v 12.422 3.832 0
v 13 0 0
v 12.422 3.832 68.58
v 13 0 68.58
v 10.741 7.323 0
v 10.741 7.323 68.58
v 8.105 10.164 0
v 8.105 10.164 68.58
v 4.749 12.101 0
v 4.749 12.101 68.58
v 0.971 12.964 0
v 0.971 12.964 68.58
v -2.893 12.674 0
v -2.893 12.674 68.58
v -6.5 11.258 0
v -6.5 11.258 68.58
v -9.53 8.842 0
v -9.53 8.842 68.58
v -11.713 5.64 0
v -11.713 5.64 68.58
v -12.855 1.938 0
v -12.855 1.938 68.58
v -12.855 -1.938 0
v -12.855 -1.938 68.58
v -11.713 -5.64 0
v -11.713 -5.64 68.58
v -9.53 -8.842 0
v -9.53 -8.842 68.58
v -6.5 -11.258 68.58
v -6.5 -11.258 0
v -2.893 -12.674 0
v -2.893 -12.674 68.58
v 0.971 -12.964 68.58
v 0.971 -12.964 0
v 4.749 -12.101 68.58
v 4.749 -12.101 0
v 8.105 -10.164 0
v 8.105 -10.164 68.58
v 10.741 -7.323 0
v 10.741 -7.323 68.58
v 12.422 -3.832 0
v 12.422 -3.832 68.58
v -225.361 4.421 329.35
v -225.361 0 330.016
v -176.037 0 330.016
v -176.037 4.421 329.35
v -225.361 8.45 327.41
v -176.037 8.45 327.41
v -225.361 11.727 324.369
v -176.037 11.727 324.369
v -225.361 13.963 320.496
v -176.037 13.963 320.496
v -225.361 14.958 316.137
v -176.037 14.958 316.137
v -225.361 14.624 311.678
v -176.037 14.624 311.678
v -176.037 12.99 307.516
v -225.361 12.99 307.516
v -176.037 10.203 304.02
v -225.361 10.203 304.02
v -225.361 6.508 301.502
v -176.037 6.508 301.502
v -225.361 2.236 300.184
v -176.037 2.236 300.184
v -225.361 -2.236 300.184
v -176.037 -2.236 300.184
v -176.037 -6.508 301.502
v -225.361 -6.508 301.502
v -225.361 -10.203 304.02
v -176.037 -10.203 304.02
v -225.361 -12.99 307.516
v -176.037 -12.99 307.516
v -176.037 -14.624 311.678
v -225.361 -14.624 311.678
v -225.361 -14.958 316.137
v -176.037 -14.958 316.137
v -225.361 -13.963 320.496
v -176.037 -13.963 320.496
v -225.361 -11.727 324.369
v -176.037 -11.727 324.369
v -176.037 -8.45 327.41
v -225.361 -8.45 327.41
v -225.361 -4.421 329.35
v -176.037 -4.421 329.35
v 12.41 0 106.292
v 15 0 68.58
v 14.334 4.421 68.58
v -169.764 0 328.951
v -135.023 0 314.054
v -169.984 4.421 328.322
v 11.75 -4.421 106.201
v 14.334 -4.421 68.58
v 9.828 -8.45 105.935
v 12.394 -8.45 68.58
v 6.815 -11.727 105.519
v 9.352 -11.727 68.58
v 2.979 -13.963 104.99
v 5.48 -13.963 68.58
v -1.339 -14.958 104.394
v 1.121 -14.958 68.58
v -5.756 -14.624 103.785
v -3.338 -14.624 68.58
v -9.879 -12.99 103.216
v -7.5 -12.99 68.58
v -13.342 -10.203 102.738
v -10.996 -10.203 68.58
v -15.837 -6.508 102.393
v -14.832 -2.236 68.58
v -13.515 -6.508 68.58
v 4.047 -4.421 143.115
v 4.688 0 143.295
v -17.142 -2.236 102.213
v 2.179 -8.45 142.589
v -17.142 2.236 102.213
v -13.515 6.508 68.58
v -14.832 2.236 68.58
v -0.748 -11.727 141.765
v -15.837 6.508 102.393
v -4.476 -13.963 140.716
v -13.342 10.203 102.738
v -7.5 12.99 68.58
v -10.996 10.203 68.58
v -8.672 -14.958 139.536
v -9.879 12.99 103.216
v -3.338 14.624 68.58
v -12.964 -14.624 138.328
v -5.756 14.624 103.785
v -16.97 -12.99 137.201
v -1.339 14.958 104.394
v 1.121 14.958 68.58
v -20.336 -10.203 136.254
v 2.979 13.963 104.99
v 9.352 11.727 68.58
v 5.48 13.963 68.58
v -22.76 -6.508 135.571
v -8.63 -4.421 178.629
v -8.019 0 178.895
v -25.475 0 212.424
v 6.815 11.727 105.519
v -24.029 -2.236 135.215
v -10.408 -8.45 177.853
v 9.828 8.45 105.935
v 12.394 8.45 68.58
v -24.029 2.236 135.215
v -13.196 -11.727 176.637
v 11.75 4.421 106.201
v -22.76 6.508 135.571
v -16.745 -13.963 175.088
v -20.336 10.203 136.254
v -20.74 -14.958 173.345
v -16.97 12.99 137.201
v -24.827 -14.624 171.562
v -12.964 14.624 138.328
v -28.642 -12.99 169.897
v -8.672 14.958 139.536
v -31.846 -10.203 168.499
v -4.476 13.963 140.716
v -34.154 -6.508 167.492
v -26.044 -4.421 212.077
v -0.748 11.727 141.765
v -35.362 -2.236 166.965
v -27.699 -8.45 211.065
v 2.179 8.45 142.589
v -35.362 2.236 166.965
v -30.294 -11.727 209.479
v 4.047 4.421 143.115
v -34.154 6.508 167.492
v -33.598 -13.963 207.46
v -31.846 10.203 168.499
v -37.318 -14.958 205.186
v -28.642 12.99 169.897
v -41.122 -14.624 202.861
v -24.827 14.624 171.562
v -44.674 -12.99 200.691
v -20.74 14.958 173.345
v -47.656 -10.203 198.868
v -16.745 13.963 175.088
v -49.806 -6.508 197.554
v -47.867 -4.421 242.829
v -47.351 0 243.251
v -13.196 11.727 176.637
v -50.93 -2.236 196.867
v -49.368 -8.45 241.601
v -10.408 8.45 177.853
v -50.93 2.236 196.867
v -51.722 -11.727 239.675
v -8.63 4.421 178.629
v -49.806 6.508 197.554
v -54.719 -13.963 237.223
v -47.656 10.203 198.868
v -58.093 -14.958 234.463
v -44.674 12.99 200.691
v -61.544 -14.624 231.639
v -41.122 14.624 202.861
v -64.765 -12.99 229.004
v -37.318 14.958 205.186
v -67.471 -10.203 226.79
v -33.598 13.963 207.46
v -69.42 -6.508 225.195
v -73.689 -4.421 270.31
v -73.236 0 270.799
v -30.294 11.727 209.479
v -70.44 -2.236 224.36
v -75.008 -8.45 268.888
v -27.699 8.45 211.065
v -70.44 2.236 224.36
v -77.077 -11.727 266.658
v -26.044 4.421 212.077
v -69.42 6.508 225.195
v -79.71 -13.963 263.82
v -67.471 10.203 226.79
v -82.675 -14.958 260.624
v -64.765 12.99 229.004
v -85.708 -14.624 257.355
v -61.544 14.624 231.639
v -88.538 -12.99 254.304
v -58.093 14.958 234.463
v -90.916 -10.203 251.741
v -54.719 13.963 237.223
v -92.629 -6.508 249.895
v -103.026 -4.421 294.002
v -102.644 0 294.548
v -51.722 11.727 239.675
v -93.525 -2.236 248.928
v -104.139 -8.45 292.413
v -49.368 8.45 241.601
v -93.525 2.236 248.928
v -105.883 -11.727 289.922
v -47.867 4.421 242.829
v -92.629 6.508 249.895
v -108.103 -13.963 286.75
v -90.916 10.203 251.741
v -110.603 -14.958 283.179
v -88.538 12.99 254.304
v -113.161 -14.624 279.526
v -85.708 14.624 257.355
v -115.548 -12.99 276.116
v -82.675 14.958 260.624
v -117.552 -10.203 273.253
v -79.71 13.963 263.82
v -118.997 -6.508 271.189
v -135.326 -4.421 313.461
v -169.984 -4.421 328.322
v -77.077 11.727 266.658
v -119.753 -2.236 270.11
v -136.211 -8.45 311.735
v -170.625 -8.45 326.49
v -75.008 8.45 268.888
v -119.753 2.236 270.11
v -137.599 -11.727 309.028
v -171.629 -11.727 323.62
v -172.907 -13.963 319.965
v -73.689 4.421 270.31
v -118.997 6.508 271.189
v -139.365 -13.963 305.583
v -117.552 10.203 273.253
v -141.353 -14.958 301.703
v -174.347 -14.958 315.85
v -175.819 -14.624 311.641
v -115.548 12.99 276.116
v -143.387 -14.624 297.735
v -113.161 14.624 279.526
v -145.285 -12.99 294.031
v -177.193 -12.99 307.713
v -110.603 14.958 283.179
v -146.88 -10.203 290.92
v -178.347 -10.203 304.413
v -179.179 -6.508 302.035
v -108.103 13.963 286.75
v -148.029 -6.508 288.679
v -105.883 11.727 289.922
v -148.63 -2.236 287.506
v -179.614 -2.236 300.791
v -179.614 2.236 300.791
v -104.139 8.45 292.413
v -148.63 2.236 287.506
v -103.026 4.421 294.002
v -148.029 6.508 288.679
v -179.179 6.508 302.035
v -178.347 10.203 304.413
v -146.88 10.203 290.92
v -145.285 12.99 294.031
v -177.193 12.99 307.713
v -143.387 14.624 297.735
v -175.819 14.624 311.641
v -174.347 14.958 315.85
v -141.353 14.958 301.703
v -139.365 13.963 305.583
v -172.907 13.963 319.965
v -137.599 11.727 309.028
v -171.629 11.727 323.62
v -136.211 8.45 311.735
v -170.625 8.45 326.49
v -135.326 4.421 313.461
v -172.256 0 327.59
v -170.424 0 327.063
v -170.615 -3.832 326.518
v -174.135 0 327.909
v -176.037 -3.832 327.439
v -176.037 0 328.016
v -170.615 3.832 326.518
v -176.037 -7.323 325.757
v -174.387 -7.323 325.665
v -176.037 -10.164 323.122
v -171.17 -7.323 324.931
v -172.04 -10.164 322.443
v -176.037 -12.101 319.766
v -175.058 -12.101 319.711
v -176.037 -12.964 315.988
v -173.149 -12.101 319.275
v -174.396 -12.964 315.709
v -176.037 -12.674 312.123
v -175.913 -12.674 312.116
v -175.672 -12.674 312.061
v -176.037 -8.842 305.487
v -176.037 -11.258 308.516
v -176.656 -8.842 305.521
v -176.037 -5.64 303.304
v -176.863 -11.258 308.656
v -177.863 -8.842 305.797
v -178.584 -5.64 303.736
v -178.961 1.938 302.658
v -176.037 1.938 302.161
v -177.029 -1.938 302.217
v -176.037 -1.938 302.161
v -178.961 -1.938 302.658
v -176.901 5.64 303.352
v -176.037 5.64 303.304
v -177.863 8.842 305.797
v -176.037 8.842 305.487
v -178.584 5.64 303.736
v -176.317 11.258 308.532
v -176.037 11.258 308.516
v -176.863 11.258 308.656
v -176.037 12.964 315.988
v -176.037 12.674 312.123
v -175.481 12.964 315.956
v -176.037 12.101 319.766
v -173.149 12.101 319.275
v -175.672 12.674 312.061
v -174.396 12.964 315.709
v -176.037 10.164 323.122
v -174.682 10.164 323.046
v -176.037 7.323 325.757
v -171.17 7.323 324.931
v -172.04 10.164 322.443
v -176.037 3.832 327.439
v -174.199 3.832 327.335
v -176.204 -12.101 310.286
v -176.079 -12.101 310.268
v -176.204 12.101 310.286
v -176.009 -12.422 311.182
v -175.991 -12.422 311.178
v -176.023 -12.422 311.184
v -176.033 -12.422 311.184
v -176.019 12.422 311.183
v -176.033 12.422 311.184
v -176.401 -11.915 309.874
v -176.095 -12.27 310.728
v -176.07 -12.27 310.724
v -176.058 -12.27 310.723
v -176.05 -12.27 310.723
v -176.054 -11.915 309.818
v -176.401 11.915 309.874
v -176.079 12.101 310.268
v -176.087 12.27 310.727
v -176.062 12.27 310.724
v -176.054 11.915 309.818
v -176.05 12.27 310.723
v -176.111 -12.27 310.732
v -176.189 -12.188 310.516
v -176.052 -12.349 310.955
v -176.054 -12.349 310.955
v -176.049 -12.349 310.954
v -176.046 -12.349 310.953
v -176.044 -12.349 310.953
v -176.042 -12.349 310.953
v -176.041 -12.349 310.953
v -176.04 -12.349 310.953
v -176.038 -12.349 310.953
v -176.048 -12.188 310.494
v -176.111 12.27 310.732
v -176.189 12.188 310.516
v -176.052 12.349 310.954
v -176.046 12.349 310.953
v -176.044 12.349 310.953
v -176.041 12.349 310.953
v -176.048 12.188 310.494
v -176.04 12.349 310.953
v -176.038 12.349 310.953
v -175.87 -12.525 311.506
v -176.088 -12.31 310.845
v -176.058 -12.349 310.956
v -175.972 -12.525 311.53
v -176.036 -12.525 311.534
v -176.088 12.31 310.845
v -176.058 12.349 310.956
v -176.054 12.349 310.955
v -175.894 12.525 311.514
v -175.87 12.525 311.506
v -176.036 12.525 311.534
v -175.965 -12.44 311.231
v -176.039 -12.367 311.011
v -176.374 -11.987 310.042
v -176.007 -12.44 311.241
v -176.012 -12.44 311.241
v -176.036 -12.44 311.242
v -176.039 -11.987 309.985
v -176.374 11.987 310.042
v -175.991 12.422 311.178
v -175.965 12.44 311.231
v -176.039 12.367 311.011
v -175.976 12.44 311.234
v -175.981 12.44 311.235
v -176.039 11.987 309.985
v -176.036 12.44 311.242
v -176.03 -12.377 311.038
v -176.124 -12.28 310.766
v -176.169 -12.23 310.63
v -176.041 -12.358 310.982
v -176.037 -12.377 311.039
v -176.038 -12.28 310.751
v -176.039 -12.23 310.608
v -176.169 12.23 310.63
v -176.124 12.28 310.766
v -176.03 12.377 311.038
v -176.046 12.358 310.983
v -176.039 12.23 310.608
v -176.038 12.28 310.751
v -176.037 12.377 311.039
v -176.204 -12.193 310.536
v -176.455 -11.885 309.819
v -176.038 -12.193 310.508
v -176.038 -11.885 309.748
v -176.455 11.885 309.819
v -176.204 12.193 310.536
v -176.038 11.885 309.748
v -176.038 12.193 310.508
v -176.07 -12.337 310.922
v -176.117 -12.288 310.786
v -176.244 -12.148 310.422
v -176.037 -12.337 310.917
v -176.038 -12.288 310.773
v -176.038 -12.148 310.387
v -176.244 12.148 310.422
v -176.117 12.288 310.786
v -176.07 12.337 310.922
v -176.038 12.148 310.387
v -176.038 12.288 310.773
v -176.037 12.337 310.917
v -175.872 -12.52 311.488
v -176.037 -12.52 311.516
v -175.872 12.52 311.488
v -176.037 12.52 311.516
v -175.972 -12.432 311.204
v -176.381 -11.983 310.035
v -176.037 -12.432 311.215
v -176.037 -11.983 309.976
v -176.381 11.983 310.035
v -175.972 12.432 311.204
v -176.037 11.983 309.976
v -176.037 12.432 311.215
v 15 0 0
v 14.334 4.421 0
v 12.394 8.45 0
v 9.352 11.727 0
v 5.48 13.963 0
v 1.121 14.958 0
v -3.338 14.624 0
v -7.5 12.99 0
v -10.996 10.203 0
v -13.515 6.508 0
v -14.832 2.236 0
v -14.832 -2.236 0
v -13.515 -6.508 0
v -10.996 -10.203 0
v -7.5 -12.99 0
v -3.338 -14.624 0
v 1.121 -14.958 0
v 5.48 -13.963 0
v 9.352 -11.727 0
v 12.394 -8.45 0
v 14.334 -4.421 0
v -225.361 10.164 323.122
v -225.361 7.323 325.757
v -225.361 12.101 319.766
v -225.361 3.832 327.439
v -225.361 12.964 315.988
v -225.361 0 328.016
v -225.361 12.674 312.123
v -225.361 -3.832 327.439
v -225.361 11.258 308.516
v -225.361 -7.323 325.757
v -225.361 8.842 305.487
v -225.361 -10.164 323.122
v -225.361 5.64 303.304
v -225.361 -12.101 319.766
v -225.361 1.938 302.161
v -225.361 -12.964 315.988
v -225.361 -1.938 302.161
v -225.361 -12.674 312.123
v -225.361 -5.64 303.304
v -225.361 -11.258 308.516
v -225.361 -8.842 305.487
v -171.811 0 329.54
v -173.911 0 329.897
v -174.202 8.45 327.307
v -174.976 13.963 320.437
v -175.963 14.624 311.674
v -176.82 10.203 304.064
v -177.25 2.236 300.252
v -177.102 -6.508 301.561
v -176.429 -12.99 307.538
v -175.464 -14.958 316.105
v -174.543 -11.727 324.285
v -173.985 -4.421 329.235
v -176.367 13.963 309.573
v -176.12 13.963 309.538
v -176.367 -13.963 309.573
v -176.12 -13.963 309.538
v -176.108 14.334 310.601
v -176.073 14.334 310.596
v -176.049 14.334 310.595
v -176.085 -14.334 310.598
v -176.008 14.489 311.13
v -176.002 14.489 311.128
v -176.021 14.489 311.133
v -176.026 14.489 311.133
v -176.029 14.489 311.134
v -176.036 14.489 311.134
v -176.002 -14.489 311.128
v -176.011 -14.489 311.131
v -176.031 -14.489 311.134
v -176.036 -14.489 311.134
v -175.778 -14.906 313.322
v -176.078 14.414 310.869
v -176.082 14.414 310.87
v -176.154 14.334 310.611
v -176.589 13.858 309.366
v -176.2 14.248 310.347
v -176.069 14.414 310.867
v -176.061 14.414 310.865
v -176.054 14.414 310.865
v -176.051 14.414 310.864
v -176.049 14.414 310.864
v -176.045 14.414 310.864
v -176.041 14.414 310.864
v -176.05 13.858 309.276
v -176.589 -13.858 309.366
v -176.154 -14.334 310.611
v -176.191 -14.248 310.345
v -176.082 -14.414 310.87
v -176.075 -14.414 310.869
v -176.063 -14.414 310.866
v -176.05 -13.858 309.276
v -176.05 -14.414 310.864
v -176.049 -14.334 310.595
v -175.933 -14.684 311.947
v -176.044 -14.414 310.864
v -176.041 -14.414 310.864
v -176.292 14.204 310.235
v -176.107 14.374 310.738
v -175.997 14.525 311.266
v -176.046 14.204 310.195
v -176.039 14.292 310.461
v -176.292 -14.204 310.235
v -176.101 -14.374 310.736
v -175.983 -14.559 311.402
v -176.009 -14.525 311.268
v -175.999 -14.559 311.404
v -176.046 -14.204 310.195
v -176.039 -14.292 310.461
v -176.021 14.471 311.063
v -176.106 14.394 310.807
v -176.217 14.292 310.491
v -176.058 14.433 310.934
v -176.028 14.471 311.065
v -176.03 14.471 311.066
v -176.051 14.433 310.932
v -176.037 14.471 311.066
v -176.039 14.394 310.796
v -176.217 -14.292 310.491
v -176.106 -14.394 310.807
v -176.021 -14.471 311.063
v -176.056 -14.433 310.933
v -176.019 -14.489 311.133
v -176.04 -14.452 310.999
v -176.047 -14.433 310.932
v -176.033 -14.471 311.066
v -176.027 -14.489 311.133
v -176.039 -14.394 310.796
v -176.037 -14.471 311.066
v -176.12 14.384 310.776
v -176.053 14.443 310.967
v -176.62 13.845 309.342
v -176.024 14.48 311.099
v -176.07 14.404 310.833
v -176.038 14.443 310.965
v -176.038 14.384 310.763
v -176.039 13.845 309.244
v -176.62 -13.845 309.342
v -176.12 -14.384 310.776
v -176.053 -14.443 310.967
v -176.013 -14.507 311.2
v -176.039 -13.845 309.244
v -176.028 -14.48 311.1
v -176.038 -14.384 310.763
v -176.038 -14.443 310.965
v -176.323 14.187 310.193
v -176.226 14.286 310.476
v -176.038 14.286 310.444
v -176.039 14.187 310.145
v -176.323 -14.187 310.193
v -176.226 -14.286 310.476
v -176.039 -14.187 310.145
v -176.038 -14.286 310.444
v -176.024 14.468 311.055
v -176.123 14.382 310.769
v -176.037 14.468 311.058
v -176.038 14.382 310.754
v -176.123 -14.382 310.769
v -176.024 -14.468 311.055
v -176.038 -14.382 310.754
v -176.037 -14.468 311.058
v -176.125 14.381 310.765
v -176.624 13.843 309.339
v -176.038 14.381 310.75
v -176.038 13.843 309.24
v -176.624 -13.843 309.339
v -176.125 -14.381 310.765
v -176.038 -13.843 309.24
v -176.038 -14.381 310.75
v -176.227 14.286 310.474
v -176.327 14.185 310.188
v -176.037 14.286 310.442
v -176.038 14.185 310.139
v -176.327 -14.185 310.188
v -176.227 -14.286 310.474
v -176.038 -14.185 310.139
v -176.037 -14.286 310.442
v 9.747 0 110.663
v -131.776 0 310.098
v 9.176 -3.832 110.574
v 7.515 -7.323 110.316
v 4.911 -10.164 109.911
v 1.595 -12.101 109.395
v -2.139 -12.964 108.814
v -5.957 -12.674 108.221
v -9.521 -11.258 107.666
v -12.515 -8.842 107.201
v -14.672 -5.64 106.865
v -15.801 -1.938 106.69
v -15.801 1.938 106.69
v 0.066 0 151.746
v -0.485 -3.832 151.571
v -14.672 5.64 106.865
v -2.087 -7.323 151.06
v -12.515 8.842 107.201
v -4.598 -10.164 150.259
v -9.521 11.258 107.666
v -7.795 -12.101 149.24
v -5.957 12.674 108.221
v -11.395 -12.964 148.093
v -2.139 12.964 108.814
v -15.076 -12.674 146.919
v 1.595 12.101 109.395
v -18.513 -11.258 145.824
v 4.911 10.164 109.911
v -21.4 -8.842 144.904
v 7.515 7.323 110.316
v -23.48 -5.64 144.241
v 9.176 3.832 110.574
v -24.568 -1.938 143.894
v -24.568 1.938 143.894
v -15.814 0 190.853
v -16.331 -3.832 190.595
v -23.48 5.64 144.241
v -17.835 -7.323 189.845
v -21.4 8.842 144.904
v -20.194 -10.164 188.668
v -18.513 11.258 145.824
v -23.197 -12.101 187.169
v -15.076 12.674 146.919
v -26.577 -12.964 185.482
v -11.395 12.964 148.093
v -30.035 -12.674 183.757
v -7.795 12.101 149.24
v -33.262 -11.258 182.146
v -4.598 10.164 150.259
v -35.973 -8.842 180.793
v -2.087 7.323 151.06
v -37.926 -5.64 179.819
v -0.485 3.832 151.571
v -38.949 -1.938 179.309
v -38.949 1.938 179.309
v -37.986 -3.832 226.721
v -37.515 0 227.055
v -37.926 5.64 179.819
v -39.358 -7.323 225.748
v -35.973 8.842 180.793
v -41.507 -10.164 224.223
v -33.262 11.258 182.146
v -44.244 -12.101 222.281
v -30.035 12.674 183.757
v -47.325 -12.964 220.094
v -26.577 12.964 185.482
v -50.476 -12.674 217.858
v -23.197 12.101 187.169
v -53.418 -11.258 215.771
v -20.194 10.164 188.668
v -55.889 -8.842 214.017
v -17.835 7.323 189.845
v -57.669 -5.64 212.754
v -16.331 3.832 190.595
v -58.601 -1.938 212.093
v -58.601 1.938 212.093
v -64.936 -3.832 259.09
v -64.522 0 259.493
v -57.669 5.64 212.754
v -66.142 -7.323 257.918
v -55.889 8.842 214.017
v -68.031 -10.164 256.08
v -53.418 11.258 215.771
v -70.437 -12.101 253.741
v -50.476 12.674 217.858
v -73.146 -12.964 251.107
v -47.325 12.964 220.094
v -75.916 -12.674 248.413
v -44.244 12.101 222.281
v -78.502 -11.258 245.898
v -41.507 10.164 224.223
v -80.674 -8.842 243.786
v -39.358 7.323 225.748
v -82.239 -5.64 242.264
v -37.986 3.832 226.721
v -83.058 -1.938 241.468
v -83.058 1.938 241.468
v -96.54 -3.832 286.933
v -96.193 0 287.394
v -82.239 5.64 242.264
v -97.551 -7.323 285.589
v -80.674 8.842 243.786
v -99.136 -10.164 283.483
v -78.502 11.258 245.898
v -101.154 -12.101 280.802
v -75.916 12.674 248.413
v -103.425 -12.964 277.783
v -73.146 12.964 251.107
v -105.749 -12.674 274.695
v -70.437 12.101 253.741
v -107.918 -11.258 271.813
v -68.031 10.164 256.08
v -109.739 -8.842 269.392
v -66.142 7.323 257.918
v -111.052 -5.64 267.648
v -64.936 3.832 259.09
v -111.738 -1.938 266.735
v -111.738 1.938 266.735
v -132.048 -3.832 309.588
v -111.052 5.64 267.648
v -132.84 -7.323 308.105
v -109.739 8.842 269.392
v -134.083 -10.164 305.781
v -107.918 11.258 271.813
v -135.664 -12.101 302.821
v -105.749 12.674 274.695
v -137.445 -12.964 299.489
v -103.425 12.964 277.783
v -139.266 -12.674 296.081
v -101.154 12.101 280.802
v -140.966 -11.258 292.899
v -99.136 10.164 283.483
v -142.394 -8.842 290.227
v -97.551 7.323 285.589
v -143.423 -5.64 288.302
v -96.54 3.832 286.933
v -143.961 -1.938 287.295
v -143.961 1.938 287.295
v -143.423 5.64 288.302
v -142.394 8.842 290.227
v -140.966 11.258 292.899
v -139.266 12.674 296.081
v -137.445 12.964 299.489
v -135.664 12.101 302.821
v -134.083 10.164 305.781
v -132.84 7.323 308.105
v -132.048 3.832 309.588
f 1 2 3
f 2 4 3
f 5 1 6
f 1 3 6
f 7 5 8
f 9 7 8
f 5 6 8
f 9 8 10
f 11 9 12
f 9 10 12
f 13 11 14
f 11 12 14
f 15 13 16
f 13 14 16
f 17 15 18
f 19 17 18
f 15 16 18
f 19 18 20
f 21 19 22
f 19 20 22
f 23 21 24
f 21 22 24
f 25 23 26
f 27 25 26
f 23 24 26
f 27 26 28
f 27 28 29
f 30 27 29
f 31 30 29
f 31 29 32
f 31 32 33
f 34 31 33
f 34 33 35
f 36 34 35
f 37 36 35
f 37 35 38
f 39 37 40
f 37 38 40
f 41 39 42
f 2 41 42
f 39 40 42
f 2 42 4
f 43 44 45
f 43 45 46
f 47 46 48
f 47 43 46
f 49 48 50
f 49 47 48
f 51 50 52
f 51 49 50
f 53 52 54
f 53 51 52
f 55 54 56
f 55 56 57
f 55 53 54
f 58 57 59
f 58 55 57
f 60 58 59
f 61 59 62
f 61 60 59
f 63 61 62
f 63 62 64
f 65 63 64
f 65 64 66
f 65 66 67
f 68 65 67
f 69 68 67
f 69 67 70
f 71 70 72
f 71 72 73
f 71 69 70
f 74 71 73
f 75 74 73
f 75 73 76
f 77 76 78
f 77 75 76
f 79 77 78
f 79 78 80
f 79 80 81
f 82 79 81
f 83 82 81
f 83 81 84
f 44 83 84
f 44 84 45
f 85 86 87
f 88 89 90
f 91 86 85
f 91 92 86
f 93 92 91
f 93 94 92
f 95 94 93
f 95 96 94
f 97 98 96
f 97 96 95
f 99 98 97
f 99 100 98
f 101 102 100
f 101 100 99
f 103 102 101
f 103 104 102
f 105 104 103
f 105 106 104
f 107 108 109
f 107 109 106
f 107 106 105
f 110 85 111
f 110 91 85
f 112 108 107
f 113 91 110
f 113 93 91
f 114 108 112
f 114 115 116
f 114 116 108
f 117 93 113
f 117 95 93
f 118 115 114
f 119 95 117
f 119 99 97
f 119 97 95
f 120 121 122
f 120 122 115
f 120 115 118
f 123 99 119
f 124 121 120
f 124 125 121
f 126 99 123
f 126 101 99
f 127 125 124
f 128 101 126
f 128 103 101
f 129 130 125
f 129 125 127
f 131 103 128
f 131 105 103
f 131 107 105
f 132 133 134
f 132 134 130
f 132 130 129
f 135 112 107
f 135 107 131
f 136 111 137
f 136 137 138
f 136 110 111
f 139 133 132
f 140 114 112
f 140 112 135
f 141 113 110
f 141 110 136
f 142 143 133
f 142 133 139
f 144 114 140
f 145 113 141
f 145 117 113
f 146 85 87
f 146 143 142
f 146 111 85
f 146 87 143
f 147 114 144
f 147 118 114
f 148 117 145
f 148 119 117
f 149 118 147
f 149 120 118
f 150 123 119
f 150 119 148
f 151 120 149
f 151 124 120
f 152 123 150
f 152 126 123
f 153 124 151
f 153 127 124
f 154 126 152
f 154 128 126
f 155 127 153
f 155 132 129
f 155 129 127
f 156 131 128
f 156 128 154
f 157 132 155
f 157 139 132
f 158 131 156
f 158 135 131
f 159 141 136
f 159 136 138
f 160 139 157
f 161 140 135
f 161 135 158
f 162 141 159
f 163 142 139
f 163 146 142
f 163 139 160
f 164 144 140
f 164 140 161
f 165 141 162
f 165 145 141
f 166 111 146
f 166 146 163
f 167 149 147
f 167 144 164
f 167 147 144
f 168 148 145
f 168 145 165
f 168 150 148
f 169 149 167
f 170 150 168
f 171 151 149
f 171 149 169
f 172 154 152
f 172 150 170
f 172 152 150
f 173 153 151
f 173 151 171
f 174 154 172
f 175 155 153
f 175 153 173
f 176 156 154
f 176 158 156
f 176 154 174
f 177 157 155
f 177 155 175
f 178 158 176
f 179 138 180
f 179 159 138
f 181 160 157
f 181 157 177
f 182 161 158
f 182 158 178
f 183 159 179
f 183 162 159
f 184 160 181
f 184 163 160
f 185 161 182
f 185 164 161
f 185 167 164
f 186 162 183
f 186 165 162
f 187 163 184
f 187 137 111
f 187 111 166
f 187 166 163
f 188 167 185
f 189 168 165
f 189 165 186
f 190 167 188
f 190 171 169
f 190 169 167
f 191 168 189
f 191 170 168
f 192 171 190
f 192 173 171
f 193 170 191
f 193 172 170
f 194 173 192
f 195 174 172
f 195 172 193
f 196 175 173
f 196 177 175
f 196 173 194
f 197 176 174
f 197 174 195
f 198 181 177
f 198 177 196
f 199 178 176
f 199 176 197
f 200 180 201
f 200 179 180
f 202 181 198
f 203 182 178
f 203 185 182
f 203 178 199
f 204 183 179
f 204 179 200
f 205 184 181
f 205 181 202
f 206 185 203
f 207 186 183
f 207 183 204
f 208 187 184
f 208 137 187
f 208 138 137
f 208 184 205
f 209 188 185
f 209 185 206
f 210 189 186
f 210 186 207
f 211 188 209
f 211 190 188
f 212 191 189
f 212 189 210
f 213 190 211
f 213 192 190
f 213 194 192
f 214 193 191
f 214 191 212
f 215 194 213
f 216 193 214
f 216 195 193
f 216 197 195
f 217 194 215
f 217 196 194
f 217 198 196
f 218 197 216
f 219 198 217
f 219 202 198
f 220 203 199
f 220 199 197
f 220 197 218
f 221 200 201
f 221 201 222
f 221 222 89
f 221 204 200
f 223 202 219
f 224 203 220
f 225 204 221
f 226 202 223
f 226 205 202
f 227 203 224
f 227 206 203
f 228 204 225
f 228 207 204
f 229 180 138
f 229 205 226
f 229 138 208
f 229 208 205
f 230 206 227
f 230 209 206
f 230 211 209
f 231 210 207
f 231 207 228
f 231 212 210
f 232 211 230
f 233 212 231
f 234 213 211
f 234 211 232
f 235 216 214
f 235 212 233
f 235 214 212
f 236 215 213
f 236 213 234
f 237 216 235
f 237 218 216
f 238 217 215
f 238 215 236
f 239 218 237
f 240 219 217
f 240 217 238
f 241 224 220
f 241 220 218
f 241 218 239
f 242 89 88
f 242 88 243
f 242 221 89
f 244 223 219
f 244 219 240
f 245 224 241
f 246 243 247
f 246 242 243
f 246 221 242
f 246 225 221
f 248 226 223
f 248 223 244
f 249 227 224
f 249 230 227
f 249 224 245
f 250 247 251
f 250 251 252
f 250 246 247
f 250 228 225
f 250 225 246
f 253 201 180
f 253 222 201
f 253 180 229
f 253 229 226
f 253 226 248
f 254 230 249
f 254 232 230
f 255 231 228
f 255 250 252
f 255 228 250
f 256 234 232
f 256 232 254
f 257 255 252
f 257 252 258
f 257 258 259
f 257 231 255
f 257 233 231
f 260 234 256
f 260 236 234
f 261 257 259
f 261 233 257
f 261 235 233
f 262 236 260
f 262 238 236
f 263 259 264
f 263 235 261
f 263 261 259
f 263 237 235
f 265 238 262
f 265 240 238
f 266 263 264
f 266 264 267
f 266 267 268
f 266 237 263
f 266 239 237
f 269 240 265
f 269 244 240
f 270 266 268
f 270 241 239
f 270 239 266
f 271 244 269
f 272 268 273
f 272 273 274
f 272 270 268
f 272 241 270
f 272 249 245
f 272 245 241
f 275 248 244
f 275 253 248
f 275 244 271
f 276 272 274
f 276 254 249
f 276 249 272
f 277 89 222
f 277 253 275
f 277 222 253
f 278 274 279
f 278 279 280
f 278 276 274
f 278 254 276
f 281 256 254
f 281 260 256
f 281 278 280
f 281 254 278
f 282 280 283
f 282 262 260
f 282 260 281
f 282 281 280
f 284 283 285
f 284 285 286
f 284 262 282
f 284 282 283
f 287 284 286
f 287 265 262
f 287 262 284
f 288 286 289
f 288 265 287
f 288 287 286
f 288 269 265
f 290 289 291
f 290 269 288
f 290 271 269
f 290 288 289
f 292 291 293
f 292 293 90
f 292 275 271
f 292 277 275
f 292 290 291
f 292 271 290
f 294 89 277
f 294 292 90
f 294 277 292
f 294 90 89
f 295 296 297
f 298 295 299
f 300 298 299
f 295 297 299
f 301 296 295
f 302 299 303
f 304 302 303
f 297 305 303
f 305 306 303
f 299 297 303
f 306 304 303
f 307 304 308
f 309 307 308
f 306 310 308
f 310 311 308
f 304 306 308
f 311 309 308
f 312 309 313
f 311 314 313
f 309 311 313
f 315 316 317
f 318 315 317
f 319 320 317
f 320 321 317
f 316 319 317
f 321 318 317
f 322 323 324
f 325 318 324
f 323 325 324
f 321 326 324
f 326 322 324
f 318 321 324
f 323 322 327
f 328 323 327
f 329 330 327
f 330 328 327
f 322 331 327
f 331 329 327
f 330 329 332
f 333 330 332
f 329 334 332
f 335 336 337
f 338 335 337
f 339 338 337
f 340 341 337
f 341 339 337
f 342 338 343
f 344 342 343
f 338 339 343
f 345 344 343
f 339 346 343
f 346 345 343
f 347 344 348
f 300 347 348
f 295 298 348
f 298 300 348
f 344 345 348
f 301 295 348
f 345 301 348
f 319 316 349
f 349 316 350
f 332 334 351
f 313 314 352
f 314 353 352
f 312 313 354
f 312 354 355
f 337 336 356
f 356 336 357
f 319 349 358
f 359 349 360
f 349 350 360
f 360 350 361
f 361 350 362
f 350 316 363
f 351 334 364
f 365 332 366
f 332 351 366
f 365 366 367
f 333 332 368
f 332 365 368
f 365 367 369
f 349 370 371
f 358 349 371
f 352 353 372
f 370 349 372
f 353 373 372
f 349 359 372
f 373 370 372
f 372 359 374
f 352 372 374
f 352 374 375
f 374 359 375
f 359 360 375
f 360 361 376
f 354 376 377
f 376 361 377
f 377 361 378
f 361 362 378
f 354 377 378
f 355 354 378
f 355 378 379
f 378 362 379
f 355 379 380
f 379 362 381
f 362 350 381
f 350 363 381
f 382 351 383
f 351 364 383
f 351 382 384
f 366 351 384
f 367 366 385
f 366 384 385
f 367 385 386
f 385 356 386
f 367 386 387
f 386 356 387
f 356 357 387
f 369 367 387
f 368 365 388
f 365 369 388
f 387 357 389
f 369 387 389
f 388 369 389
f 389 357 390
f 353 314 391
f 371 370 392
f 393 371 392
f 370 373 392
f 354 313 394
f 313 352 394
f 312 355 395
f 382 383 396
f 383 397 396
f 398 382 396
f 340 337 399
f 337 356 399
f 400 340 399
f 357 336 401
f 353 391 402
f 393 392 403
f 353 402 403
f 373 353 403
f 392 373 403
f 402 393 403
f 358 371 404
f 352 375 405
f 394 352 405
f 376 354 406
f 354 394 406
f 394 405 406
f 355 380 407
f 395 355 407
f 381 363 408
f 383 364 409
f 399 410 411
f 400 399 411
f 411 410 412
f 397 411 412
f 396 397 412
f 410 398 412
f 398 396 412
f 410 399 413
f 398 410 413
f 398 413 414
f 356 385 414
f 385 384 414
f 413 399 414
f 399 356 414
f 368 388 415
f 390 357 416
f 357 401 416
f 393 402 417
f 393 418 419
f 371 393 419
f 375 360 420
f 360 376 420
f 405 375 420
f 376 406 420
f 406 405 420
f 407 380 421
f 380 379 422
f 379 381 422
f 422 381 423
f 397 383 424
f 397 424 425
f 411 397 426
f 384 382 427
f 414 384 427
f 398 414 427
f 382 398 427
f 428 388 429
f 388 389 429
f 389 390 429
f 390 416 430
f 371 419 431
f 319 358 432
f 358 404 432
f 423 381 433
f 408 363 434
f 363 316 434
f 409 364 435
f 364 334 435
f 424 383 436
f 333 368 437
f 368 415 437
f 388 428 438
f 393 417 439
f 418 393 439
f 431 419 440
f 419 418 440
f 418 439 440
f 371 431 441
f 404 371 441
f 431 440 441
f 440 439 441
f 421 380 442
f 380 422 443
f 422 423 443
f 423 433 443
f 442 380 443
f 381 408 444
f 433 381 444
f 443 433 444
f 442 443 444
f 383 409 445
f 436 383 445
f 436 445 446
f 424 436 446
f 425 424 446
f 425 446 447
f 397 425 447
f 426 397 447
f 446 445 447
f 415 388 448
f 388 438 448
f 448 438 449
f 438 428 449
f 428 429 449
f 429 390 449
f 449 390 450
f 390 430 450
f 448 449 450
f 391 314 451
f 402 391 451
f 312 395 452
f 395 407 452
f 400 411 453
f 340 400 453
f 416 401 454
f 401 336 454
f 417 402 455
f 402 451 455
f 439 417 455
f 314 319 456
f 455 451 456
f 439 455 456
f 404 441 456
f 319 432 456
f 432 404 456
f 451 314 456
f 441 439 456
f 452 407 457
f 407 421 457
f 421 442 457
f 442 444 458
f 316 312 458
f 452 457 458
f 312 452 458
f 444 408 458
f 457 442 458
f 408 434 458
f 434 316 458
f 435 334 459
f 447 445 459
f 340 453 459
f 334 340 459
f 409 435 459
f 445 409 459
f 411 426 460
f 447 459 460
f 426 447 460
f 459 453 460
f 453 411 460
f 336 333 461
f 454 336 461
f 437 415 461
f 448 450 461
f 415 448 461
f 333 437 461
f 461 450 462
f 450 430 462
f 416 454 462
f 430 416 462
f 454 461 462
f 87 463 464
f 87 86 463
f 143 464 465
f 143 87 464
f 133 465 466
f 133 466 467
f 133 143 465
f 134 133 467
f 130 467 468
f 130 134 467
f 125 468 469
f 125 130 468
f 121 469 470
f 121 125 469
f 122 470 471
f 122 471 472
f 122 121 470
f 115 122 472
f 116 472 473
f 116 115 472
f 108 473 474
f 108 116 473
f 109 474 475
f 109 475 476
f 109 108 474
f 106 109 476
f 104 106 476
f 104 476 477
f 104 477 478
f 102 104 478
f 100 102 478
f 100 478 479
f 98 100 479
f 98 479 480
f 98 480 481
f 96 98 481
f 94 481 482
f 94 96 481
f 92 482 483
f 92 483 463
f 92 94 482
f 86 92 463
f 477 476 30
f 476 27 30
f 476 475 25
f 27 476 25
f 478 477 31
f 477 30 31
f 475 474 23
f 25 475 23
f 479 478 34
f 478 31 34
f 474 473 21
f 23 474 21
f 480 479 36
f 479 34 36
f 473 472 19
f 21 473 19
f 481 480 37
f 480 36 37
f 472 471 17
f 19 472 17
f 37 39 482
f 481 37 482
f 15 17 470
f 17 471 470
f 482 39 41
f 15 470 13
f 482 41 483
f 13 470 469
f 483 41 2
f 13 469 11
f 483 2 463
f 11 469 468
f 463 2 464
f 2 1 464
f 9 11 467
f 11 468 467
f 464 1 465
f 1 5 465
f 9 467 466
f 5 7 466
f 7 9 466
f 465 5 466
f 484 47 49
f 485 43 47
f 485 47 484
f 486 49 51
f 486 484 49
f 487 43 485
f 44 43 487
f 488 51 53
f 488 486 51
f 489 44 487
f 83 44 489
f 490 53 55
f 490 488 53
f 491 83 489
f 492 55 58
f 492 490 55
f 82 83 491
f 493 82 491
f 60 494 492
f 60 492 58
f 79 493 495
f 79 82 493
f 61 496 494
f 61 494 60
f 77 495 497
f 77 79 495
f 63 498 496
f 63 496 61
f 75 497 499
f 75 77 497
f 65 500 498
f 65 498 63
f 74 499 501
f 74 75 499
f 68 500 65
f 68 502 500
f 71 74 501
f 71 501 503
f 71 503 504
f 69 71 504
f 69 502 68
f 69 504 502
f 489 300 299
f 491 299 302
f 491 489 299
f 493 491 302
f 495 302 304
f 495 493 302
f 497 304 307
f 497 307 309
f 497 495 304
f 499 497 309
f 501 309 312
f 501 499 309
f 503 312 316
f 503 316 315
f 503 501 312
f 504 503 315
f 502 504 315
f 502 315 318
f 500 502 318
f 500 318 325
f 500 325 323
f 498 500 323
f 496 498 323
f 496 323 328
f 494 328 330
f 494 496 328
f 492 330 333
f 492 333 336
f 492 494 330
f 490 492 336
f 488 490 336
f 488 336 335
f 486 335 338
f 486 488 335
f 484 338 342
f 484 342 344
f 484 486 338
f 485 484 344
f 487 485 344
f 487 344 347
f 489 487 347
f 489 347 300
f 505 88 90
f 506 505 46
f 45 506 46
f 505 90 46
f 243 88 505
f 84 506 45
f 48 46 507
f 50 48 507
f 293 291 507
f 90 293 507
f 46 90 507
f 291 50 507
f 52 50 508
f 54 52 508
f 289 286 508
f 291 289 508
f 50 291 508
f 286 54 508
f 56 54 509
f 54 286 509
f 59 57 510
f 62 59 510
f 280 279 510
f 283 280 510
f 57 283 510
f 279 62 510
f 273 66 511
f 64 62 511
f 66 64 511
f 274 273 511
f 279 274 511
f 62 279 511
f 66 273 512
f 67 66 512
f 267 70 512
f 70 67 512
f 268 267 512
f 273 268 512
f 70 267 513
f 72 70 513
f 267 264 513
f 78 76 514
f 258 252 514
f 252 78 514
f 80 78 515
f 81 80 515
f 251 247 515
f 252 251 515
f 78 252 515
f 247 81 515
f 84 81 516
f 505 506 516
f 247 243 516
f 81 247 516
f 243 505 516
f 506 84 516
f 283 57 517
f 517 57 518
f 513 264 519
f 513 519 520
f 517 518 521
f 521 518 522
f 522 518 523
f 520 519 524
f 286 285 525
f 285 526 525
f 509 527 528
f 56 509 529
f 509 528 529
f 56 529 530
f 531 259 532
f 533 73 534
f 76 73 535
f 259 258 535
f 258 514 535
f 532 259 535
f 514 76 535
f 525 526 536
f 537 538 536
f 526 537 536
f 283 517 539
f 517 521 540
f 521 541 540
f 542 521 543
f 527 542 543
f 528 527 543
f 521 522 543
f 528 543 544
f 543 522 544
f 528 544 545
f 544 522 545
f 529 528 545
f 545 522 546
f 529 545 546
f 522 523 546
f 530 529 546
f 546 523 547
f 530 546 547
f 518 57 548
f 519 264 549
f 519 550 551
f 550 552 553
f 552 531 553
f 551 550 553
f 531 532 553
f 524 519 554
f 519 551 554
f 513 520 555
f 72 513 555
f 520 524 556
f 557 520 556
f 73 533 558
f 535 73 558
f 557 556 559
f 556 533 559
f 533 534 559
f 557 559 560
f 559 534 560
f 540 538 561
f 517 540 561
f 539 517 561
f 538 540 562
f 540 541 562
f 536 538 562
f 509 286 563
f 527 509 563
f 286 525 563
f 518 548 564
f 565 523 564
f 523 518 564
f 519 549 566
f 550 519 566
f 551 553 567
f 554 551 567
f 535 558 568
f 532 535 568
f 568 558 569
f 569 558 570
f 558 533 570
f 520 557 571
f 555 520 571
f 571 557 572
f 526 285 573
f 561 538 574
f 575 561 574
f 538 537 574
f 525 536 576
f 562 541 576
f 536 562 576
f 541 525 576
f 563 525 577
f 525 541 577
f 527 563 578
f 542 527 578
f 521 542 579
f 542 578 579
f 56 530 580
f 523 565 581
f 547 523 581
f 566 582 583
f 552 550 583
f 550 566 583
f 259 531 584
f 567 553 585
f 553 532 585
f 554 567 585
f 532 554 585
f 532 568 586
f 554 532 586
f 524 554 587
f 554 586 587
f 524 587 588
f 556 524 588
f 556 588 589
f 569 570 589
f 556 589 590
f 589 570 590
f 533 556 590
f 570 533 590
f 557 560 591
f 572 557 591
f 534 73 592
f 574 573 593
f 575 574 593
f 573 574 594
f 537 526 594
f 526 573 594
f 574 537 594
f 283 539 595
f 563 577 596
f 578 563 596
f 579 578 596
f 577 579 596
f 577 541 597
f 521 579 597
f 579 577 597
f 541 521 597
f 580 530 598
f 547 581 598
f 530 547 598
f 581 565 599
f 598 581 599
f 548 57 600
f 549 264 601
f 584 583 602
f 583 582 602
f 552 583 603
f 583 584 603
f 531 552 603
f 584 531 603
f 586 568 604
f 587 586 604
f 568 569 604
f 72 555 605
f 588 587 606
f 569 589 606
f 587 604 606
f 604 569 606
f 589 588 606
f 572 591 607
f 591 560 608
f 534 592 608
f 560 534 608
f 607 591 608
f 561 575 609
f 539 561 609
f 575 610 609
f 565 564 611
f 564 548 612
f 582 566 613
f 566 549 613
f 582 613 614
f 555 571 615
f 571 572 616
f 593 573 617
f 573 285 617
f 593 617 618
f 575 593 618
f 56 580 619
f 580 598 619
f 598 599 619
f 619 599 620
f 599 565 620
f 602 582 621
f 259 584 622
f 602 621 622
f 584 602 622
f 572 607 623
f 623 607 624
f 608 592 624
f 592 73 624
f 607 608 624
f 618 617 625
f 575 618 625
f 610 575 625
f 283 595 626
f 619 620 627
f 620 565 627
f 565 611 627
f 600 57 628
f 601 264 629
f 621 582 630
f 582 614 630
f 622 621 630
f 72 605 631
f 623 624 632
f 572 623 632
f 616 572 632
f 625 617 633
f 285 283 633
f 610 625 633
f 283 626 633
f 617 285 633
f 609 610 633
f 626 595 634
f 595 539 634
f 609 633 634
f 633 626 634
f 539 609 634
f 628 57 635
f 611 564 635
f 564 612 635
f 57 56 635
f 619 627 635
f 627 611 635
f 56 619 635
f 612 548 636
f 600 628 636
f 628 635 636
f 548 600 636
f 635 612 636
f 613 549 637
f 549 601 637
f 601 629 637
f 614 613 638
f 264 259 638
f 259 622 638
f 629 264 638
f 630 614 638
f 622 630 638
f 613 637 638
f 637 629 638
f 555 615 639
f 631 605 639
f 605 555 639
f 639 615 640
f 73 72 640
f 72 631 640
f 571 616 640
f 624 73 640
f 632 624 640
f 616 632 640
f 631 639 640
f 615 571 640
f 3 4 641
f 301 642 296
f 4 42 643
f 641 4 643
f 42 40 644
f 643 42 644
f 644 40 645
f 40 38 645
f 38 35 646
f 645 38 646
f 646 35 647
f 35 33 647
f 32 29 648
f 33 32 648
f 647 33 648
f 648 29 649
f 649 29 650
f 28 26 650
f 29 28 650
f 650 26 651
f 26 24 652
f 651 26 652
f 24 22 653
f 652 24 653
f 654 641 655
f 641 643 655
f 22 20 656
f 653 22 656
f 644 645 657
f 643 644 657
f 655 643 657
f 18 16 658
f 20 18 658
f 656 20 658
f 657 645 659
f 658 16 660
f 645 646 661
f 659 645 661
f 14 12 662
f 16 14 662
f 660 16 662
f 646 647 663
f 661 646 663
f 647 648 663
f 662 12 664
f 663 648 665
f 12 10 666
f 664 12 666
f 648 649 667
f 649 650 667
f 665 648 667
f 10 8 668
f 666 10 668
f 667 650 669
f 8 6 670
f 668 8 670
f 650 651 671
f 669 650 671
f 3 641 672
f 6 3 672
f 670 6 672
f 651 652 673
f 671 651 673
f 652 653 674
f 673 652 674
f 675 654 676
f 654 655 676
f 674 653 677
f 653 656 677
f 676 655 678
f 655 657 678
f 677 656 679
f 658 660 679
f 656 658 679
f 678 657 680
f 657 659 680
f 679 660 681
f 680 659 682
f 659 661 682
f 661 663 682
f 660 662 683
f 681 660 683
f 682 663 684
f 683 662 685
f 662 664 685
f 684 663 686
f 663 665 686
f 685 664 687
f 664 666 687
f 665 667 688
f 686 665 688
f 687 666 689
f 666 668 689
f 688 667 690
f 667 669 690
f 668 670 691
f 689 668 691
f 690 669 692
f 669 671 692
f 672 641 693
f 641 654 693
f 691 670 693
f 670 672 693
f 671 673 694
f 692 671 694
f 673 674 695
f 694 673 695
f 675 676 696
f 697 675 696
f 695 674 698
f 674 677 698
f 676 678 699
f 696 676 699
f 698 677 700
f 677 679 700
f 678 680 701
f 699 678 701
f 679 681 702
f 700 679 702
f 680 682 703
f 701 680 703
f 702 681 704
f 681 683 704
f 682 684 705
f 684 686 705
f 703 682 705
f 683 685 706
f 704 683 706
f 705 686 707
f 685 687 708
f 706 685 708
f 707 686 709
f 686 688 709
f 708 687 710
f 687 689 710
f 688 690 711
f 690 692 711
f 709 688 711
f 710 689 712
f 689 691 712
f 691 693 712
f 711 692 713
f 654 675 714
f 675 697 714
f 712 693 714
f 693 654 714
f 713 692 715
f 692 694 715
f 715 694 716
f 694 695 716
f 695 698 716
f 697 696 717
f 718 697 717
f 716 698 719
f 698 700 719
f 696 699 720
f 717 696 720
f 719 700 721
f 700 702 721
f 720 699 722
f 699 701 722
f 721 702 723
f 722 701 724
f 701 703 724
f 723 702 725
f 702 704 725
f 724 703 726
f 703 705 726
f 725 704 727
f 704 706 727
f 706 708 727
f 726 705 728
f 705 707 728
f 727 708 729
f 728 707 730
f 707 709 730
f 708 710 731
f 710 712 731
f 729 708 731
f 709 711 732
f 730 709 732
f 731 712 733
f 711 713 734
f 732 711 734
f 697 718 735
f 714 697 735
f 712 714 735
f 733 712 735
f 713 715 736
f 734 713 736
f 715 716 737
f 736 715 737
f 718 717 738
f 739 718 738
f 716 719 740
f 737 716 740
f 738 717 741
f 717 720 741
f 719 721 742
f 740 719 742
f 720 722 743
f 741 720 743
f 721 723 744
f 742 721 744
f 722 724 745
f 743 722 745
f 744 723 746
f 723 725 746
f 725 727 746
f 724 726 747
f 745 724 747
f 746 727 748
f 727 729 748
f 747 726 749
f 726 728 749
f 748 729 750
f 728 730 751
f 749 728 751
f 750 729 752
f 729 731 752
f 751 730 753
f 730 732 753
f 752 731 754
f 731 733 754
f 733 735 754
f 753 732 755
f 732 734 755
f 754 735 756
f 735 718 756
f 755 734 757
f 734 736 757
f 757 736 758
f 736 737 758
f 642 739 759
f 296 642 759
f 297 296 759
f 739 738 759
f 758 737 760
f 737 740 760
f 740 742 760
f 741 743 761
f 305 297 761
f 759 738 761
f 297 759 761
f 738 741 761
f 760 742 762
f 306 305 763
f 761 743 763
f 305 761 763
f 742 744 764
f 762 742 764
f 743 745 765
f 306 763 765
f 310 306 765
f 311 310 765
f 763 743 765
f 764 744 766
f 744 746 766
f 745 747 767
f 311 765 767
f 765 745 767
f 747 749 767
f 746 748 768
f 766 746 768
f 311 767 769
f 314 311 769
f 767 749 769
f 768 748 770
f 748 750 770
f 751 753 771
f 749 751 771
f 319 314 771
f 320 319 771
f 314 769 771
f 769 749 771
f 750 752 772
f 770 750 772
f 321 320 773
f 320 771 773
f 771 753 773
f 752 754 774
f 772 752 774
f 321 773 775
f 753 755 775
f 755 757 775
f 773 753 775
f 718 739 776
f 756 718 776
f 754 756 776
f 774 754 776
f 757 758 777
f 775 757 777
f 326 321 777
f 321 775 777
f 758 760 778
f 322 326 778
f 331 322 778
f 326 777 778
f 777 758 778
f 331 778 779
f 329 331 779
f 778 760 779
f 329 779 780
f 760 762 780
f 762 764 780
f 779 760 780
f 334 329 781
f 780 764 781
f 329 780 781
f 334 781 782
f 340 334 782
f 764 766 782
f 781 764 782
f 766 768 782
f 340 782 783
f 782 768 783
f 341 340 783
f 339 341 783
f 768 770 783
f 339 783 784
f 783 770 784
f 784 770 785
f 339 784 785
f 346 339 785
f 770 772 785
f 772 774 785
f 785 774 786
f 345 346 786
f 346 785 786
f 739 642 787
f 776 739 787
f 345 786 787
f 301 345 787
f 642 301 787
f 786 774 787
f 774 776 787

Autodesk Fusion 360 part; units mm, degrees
sketch "Sketch1" plane through (0, 0, 0) normal (0, 0, 1) x (1, 0, 0)
  circle A0 centre (0, 0) radius 15
  circle A1 centre (0, 0) radius 13
  dimension "d1" = 30
  dimension "d2" = 26
sketch "Sketch2" plane through (0, 0, 0) normal (0, 1, 0) x (1, 0, 0)
  line L0 (0, 0) -> (0, -68.58)
  arc A0 (-174.7167, -314.7919) -> (0, -68.58) centre (-260.84, -68.58) ccw
  line L1 (-176.0374, -315.0162) -> (-225.3607, -315.0162)
  arc A1 (-176.0374, -315.0162) -> (-174.7167, -314.7919) centre (-176.0374, -311.0162) ccw
  point P0 (-175.3607, -315.0162)
  dimension "d3" = 68.58
  dimension "d4" = 260.84
  dimension "d5" = 50
  dimension "d6" = 4
sweep "Sweep1" add profiles "Sketch1" path "Sketch2" along L0 A0 A1 L1 section 1
